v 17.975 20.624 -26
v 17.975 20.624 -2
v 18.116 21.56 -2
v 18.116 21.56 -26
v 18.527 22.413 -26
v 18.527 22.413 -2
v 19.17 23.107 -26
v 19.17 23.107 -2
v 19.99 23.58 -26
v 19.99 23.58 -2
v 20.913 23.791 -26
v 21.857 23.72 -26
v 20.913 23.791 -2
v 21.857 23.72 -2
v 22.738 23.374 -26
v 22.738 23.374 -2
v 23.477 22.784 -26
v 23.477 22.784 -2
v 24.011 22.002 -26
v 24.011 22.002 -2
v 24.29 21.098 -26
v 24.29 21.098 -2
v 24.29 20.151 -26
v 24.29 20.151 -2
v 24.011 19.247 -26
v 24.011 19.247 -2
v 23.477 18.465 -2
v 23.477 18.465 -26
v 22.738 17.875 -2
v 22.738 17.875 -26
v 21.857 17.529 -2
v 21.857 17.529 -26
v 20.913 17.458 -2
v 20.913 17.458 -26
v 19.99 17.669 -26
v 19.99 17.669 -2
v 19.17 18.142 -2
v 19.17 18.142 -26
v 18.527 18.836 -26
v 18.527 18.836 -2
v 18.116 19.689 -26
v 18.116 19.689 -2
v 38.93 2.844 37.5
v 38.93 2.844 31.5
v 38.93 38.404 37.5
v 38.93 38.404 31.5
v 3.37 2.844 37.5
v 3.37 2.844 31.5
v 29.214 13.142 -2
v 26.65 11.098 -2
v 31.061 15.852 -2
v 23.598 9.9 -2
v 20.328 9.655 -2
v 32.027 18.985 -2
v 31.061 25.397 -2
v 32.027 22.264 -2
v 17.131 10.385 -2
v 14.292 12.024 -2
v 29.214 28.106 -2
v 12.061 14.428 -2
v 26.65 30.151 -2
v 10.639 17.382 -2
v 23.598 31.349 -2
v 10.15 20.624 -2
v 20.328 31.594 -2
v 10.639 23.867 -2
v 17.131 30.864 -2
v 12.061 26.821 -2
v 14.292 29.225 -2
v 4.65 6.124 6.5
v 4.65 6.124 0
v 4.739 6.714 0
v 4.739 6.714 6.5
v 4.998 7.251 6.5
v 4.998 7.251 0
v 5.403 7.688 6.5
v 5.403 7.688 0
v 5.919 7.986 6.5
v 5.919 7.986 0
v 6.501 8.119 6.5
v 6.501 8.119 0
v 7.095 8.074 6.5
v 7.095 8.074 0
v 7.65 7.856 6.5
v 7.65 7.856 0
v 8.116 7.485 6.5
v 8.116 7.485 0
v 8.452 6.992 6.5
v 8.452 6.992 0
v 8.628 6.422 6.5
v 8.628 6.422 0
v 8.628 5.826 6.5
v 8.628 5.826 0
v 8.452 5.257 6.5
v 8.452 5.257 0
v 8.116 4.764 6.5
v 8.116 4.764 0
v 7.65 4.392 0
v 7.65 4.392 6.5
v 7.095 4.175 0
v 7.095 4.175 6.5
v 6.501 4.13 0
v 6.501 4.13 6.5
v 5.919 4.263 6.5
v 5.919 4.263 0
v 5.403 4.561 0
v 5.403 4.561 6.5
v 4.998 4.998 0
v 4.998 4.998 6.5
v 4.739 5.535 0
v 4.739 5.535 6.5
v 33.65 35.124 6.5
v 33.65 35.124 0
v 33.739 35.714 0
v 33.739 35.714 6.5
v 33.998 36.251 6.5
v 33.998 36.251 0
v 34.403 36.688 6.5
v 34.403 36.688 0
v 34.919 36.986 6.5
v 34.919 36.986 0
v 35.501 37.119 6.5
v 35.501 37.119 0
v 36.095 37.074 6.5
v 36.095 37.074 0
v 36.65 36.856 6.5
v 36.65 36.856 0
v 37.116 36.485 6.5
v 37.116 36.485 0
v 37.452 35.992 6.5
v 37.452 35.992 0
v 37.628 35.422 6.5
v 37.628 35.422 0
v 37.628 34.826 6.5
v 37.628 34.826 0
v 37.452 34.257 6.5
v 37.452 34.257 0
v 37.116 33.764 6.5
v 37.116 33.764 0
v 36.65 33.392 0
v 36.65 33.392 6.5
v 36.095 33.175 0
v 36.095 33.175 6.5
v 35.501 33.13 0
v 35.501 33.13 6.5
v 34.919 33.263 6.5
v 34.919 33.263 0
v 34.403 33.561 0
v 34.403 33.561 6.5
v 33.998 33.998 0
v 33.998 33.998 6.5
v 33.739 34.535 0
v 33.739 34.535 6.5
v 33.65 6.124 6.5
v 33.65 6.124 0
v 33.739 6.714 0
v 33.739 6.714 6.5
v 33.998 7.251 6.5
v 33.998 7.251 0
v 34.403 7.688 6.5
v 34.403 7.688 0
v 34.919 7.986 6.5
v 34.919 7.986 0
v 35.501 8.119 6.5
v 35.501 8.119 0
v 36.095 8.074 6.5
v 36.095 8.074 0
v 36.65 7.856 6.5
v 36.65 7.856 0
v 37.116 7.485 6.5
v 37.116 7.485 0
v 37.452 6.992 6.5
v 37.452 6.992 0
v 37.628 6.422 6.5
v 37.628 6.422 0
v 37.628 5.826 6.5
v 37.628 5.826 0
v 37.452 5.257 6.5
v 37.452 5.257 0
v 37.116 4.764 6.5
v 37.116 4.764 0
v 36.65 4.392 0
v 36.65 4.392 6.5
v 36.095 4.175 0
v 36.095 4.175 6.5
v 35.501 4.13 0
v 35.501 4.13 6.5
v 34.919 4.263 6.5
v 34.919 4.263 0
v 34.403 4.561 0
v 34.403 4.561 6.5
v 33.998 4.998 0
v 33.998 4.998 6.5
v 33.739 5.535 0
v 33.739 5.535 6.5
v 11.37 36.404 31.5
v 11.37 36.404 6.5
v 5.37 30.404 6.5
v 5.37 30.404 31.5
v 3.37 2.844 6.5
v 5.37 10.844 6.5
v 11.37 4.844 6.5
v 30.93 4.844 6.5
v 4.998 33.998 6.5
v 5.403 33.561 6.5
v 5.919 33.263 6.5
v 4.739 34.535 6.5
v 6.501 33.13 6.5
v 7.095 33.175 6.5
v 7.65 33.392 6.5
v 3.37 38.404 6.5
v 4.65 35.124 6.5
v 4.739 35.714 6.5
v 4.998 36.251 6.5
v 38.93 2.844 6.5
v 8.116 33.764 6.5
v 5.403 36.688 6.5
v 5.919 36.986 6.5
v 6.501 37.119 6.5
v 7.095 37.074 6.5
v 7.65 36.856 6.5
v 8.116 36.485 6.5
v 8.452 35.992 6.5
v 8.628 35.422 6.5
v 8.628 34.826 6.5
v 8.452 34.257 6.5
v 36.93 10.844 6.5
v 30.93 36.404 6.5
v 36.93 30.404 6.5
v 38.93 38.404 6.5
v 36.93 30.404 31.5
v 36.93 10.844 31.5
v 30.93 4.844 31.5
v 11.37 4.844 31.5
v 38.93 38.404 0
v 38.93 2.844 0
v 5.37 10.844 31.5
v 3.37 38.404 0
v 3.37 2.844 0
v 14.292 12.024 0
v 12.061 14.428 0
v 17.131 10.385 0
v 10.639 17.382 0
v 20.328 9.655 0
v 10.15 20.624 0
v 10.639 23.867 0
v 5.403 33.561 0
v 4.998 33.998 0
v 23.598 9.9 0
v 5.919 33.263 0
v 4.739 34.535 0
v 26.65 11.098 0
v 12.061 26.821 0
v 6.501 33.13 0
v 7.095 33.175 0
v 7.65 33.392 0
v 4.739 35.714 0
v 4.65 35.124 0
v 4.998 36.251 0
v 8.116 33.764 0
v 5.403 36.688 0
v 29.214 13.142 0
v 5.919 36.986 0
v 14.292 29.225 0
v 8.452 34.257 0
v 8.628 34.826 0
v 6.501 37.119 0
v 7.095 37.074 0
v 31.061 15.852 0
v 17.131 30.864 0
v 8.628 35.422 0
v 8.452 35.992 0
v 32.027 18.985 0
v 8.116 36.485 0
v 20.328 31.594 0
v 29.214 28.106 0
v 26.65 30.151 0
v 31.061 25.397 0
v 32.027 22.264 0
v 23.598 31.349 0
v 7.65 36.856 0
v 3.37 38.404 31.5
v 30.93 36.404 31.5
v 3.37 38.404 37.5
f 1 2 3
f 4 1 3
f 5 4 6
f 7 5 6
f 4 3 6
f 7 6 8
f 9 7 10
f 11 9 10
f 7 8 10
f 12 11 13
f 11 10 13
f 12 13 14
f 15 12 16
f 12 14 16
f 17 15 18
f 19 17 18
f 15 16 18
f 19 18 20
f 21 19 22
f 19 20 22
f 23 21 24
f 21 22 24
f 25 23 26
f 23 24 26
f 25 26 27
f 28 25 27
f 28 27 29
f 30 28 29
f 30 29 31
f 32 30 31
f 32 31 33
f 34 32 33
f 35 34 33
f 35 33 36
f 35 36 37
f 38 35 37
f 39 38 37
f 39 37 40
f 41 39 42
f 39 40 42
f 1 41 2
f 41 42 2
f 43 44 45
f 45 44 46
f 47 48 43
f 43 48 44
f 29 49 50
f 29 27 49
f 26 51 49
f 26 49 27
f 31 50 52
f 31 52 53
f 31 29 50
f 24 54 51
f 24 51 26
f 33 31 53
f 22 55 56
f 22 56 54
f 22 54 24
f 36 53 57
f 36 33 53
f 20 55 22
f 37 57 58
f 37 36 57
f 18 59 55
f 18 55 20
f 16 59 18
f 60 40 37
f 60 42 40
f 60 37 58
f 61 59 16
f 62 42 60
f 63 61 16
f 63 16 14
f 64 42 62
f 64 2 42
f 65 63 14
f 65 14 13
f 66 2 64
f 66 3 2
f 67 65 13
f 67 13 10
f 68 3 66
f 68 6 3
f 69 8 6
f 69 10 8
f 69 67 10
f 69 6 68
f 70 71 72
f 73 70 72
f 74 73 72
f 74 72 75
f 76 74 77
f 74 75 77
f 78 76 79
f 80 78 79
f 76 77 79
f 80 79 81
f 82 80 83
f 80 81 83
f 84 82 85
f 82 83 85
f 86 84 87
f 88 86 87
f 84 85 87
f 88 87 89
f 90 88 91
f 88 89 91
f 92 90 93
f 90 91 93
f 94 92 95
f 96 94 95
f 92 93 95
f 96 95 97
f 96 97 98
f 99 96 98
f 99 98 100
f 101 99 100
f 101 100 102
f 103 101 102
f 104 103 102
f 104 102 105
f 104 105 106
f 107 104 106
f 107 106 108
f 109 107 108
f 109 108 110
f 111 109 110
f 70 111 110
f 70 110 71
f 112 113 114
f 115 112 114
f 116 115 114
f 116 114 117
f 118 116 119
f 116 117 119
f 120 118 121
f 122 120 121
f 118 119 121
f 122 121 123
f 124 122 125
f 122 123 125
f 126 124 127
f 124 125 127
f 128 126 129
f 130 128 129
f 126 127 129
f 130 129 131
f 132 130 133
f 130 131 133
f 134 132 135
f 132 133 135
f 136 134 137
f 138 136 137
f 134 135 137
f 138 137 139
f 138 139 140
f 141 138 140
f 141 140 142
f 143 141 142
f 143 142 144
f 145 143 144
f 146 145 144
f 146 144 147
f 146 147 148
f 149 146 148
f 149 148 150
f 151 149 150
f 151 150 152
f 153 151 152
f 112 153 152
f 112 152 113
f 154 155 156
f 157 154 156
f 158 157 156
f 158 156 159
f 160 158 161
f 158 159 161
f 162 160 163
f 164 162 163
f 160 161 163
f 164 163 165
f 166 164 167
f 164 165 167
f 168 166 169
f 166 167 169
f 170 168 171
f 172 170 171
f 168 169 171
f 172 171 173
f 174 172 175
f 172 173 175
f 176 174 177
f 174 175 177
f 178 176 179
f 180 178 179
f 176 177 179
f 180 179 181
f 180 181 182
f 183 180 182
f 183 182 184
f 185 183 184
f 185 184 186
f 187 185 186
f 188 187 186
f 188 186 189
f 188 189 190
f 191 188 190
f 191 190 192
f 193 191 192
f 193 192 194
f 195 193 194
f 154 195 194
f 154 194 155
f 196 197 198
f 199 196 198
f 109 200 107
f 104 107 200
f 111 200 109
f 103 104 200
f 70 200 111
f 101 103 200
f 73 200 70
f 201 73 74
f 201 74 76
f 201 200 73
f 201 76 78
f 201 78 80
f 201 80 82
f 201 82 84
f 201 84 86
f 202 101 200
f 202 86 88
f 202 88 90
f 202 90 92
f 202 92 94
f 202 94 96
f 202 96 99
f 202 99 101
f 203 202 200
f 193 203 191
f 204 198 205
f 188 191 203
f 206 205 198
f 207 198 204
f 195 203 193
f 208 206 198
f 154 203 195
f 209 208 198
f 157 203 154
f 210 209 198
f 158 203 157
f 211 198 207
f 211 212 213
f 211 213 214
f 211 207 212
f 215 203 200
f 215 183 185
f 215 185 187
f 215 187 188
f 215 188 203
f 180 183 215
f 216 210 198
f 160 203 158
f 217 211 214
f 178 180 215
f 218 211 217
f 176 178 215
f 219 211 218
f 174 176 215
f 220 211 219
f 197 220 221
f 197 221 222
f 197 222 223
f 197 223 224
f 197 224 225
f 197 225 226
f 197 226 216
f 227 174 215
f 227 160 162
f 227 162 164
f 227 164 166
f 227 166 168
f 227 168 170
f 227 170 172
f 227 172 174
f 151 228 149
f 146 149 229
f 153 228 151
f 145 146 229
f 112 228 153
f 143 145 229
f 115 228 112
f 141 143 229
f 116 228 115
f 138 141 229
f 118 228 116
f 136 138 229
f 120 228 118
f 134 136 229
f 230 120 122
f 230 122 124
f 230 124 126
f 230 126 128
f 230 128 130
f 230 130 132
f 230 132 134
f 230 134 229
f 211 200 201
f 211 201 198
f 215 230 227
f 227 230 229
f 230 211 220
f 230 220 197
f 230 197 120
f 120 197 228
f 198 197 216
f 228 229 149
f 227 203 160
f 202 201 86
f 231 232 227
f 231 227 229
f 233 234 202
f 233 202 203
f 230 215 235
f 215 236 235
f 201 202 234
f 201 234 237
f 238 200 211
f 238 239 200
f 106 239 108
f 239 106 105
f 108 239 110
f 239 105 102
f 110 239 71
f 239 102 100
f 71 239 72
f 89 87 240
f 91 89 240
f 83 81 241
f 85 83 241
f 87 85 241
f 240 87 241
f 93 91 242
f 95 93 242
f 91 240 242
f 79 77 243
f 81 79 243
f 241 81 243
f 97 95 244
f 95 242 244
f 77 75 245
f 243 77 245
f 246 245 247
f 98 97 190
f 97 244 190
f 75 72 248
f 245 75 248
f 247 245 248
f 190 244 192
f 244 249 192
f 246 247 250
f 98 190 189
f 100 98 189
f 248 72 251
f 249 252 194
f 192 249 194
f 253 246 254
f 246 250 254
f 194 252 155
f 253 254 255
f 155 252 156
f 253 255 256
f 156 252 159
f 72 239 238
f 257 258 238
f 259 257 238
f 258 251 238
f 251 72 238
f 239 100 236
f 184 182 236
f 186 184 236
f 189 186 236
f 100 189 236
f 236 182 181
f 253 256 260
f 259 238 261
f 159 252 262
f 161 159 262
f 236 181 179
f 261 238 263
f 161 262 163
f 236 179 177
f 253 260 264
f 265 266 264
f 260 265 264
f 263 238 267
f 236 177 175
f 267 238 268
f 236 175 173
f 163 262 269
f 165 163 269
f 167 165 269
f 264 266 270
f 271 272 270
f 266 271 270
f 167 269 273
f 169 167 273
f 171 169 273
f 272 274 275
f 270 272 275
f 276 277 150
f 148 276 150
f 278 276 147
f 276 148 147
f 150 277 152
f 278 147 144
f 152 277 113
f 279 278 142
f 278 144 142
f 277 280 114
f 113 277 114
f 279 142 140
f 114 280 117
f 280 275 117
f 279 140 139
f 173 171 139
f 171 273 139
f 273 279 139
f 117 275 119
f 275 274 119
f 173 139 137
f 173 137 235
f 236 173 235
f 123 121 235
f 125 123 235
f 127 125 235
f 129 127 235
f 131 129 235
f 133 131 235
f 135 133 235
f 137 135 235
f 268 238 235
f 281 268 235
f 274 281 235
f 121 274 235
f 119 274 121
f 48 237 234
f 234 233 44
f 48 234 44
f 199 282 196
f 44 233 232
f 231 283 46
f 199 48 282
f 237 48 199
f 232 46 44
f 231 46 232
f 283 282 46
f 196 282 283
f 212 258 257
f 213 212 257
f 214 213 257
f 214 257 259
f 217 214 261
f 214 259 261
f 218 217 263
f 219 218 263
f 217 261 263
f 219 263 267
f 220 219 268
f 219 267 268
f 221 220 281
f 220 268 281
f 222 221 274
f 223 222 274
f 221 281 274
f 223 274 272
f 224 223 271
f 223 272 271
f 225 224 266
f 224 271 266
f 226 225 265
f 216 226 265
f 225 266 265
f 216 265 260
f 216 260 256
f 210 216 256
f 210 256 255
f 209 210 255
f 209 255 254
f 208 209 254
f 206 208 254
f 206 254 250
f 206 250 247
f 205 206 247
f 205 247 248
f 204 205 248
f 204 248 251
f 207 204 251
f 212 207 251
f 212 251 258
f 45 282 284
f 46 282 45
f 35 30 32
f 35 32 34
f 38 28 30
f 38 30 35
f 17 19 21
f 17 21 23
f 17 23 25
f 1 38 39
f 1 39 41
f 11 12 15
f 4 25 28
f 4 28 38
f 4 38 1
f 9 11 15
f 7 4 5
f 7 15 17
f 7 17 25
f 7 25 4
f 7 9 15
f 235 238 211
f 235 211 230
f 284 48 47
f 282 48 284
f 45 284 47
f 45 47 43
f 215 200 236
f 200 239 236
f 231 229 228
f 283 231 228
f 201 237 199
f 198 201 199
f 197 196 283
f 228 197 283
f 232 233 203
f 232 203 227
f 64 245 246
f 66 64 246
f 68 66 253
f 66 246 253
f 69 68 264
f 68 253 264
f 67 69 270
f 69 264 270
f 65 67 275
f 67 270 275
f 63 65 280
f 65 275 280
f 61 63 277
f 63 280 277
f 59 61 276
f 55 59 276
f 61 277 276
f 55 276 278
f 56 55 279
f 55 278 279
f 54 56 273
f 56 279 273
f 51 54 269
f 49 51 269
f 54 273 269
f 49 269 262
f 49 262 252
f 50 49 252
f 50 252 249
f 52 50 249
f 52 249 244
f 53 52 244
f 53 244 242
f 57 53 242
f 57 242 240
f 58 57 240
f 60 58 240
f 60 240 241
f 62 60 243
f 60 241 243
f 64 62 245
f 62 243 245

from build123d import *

# Parameters (mm, degrees)
SKETCH1_W           = 35.56
SKETCH1_H           = 35.56
BOSS_EXTRUDE1_DEPTH = 4.5
SKETCH2_W           = 35.56
SKETCH2_H           = 35.56
BOSS_EXTRUDE2_DEPTH = 2
SKETCH5_R           = 11
BOSS_EXTRUDE5_DEPTH = 2
SKETCH6_R           = 3.175
BOSS_EXTRUDE6_DEPTH = 24
SKETCH7_R           = 2
CUT_EXTRUDE3_DEPTH  = 29
SKETCH8_W           = 31.56
SKETCH8_H           = 31.56
BOSS_EXTRUDE7_DEPTH = 25
SKETCH9_W           = 35.56
SKETCH9_H           = 35.56
BOSS_EXTRUDE8_DEPTH = 6
CHAMFER1_SIZE       = 6


with BuildPart() as part:
    # Sketch1 → Boss-Extrude1 (new body)
    with BuildSketch(Plane.XY):
        with Locations((21.15, 20.624391857)):
            Rectangle(SKETCH1_W, SKETCH1_H)
    extrude(amount=BOSS_EXTRUDE1_DEPTH)

    # Sketch2 → Boss-Extrude2 (add)
    with BuildSketch(Plane.XY.offset(4.5)):
        with Locations((21.15, 20.624391857)):
            Rectangle(SKETCH2_W, SKETCH2_H)
    extrude(amount=BOSS_EXTRUDE2_DEPTH)

    # Sketch5 → Boss-Extrude5 (add)
    with BuildSketch(Plane(origin=(0, 0, 0), x_dir=(-1, 0, 0), z_dir=(0, 0, -1))):
        with Locations((-21.15, 20.624391857)):
            Circle(SKETCH5_R)
    extrude(amount=BOSS_EXTRUDE5_DEPTH)

    # Sketch6 → Boss-Extrude6 (add)
    with BuildSketch(Plane(origin=(0, 0, -2), x_dir=(-1, 0, 0), z_dir=(0, 0, -1))):
        with Locations((-21.15, 20.624391857)):
            Circle(SKETCH6_R)
    extrude(amount=BOSS_EXTRUDE6_DEPTH)

    # Sketch7 → Cut-Extrude3 (cut)
    with BuildSketch(Plane(origin=(0, 0, 0), x_dir=(-1, 0, 0), z_dir=(0, 0, -1))):
        with Locations((-35.65, 6.124391857)):
            Circle(SKETCH7_R)
        with Locations((-6.65, 6.124391857)):
            Circle(SKETCH7_R)
        with Locations((-6.65, 35.124391857)):
            Circle(SKETCH7_R)
        with Locations((-35.65, 35.124391857)):
            Circle(SKETCH7_R)
    extrude(amount=-CUT_EXTRUDE3_DEPTH, mode=Mode.SUBTRACT)

    # Sketch8 → Boss-Extrude7 (add)
    with BuildSketch(Plane.XY.offset(6.5)):
        with Locations((21.15, 20.624391857)):
            Rectangle(SKETCH8_W, SKETCH8_H)
    extrude(amount=BOSS_EXTRUDE7_DEPTH)

    # Sketch9 → Boss-Extrude8 (add)
    with BuildSketch(Plane.XY.offset(31.5)):
        with Locations((21.15, 20.624391857)):
            Rectangle(SKETCH9_W, SKETCH9_H)
    extrude(amount=BOSS_EXTRUDE8_DEPTH)

    # Chamfer1
    # the kernel refuses this chamfer: 6 mm, written as the material it takes off along each edge
    with BuildSketch(Plane(origin=(5.37, 36.404391857, 6.5), x_dir=(0.9996219169112968, 0.02749587661058678, 0), z_dir=(0, 0, 1)), Plane(origin=(36.93, 4.844391857, 6.5), x_dir=(-0.9996219169112969, -0.027495876610586355, 0), z_dir=(0, 0, 1)), Plane(origin=(36.93, 36.404391857, 6.5), x_dir=(0.02749587661058678, -0.9996219169112968, 0), z_dir=(0, 0, 1))) as chamfer1_piece_1:
        Polygon((CHAMFER1_SIZE * 0.999621916911, -CHAMFER1_SIZE * 0.0274958766106), (-CHAMFER1_SIZE * 0.0274958766106, -CHAMFER1_SIZE * 0.999621916911), (0, 0), align=None)
    extrude(amount=25, mode=Mode.SUBTRACT)
    with BuildSketch(Plane(origin=(5.37, 4.844391857, 6.5), x_dir=(0.9996219169112969, -0.027495876610586348, 0), z_dir=(0, 0, 1))) as chamfer1_piece_2:
        Polygon((CHAMFER1_SIZE * 0.999621916911, CHAMFER1_SIZE * 0.0274958766106), (-CHAMFER1_SIZE * 0.0274958766106, CHAMFER1_SIZE * 0.999621916911), (0, 0), align=None)
    extrude(amount=25, mode=Mode.SUBTRACT)


solid = part.part
